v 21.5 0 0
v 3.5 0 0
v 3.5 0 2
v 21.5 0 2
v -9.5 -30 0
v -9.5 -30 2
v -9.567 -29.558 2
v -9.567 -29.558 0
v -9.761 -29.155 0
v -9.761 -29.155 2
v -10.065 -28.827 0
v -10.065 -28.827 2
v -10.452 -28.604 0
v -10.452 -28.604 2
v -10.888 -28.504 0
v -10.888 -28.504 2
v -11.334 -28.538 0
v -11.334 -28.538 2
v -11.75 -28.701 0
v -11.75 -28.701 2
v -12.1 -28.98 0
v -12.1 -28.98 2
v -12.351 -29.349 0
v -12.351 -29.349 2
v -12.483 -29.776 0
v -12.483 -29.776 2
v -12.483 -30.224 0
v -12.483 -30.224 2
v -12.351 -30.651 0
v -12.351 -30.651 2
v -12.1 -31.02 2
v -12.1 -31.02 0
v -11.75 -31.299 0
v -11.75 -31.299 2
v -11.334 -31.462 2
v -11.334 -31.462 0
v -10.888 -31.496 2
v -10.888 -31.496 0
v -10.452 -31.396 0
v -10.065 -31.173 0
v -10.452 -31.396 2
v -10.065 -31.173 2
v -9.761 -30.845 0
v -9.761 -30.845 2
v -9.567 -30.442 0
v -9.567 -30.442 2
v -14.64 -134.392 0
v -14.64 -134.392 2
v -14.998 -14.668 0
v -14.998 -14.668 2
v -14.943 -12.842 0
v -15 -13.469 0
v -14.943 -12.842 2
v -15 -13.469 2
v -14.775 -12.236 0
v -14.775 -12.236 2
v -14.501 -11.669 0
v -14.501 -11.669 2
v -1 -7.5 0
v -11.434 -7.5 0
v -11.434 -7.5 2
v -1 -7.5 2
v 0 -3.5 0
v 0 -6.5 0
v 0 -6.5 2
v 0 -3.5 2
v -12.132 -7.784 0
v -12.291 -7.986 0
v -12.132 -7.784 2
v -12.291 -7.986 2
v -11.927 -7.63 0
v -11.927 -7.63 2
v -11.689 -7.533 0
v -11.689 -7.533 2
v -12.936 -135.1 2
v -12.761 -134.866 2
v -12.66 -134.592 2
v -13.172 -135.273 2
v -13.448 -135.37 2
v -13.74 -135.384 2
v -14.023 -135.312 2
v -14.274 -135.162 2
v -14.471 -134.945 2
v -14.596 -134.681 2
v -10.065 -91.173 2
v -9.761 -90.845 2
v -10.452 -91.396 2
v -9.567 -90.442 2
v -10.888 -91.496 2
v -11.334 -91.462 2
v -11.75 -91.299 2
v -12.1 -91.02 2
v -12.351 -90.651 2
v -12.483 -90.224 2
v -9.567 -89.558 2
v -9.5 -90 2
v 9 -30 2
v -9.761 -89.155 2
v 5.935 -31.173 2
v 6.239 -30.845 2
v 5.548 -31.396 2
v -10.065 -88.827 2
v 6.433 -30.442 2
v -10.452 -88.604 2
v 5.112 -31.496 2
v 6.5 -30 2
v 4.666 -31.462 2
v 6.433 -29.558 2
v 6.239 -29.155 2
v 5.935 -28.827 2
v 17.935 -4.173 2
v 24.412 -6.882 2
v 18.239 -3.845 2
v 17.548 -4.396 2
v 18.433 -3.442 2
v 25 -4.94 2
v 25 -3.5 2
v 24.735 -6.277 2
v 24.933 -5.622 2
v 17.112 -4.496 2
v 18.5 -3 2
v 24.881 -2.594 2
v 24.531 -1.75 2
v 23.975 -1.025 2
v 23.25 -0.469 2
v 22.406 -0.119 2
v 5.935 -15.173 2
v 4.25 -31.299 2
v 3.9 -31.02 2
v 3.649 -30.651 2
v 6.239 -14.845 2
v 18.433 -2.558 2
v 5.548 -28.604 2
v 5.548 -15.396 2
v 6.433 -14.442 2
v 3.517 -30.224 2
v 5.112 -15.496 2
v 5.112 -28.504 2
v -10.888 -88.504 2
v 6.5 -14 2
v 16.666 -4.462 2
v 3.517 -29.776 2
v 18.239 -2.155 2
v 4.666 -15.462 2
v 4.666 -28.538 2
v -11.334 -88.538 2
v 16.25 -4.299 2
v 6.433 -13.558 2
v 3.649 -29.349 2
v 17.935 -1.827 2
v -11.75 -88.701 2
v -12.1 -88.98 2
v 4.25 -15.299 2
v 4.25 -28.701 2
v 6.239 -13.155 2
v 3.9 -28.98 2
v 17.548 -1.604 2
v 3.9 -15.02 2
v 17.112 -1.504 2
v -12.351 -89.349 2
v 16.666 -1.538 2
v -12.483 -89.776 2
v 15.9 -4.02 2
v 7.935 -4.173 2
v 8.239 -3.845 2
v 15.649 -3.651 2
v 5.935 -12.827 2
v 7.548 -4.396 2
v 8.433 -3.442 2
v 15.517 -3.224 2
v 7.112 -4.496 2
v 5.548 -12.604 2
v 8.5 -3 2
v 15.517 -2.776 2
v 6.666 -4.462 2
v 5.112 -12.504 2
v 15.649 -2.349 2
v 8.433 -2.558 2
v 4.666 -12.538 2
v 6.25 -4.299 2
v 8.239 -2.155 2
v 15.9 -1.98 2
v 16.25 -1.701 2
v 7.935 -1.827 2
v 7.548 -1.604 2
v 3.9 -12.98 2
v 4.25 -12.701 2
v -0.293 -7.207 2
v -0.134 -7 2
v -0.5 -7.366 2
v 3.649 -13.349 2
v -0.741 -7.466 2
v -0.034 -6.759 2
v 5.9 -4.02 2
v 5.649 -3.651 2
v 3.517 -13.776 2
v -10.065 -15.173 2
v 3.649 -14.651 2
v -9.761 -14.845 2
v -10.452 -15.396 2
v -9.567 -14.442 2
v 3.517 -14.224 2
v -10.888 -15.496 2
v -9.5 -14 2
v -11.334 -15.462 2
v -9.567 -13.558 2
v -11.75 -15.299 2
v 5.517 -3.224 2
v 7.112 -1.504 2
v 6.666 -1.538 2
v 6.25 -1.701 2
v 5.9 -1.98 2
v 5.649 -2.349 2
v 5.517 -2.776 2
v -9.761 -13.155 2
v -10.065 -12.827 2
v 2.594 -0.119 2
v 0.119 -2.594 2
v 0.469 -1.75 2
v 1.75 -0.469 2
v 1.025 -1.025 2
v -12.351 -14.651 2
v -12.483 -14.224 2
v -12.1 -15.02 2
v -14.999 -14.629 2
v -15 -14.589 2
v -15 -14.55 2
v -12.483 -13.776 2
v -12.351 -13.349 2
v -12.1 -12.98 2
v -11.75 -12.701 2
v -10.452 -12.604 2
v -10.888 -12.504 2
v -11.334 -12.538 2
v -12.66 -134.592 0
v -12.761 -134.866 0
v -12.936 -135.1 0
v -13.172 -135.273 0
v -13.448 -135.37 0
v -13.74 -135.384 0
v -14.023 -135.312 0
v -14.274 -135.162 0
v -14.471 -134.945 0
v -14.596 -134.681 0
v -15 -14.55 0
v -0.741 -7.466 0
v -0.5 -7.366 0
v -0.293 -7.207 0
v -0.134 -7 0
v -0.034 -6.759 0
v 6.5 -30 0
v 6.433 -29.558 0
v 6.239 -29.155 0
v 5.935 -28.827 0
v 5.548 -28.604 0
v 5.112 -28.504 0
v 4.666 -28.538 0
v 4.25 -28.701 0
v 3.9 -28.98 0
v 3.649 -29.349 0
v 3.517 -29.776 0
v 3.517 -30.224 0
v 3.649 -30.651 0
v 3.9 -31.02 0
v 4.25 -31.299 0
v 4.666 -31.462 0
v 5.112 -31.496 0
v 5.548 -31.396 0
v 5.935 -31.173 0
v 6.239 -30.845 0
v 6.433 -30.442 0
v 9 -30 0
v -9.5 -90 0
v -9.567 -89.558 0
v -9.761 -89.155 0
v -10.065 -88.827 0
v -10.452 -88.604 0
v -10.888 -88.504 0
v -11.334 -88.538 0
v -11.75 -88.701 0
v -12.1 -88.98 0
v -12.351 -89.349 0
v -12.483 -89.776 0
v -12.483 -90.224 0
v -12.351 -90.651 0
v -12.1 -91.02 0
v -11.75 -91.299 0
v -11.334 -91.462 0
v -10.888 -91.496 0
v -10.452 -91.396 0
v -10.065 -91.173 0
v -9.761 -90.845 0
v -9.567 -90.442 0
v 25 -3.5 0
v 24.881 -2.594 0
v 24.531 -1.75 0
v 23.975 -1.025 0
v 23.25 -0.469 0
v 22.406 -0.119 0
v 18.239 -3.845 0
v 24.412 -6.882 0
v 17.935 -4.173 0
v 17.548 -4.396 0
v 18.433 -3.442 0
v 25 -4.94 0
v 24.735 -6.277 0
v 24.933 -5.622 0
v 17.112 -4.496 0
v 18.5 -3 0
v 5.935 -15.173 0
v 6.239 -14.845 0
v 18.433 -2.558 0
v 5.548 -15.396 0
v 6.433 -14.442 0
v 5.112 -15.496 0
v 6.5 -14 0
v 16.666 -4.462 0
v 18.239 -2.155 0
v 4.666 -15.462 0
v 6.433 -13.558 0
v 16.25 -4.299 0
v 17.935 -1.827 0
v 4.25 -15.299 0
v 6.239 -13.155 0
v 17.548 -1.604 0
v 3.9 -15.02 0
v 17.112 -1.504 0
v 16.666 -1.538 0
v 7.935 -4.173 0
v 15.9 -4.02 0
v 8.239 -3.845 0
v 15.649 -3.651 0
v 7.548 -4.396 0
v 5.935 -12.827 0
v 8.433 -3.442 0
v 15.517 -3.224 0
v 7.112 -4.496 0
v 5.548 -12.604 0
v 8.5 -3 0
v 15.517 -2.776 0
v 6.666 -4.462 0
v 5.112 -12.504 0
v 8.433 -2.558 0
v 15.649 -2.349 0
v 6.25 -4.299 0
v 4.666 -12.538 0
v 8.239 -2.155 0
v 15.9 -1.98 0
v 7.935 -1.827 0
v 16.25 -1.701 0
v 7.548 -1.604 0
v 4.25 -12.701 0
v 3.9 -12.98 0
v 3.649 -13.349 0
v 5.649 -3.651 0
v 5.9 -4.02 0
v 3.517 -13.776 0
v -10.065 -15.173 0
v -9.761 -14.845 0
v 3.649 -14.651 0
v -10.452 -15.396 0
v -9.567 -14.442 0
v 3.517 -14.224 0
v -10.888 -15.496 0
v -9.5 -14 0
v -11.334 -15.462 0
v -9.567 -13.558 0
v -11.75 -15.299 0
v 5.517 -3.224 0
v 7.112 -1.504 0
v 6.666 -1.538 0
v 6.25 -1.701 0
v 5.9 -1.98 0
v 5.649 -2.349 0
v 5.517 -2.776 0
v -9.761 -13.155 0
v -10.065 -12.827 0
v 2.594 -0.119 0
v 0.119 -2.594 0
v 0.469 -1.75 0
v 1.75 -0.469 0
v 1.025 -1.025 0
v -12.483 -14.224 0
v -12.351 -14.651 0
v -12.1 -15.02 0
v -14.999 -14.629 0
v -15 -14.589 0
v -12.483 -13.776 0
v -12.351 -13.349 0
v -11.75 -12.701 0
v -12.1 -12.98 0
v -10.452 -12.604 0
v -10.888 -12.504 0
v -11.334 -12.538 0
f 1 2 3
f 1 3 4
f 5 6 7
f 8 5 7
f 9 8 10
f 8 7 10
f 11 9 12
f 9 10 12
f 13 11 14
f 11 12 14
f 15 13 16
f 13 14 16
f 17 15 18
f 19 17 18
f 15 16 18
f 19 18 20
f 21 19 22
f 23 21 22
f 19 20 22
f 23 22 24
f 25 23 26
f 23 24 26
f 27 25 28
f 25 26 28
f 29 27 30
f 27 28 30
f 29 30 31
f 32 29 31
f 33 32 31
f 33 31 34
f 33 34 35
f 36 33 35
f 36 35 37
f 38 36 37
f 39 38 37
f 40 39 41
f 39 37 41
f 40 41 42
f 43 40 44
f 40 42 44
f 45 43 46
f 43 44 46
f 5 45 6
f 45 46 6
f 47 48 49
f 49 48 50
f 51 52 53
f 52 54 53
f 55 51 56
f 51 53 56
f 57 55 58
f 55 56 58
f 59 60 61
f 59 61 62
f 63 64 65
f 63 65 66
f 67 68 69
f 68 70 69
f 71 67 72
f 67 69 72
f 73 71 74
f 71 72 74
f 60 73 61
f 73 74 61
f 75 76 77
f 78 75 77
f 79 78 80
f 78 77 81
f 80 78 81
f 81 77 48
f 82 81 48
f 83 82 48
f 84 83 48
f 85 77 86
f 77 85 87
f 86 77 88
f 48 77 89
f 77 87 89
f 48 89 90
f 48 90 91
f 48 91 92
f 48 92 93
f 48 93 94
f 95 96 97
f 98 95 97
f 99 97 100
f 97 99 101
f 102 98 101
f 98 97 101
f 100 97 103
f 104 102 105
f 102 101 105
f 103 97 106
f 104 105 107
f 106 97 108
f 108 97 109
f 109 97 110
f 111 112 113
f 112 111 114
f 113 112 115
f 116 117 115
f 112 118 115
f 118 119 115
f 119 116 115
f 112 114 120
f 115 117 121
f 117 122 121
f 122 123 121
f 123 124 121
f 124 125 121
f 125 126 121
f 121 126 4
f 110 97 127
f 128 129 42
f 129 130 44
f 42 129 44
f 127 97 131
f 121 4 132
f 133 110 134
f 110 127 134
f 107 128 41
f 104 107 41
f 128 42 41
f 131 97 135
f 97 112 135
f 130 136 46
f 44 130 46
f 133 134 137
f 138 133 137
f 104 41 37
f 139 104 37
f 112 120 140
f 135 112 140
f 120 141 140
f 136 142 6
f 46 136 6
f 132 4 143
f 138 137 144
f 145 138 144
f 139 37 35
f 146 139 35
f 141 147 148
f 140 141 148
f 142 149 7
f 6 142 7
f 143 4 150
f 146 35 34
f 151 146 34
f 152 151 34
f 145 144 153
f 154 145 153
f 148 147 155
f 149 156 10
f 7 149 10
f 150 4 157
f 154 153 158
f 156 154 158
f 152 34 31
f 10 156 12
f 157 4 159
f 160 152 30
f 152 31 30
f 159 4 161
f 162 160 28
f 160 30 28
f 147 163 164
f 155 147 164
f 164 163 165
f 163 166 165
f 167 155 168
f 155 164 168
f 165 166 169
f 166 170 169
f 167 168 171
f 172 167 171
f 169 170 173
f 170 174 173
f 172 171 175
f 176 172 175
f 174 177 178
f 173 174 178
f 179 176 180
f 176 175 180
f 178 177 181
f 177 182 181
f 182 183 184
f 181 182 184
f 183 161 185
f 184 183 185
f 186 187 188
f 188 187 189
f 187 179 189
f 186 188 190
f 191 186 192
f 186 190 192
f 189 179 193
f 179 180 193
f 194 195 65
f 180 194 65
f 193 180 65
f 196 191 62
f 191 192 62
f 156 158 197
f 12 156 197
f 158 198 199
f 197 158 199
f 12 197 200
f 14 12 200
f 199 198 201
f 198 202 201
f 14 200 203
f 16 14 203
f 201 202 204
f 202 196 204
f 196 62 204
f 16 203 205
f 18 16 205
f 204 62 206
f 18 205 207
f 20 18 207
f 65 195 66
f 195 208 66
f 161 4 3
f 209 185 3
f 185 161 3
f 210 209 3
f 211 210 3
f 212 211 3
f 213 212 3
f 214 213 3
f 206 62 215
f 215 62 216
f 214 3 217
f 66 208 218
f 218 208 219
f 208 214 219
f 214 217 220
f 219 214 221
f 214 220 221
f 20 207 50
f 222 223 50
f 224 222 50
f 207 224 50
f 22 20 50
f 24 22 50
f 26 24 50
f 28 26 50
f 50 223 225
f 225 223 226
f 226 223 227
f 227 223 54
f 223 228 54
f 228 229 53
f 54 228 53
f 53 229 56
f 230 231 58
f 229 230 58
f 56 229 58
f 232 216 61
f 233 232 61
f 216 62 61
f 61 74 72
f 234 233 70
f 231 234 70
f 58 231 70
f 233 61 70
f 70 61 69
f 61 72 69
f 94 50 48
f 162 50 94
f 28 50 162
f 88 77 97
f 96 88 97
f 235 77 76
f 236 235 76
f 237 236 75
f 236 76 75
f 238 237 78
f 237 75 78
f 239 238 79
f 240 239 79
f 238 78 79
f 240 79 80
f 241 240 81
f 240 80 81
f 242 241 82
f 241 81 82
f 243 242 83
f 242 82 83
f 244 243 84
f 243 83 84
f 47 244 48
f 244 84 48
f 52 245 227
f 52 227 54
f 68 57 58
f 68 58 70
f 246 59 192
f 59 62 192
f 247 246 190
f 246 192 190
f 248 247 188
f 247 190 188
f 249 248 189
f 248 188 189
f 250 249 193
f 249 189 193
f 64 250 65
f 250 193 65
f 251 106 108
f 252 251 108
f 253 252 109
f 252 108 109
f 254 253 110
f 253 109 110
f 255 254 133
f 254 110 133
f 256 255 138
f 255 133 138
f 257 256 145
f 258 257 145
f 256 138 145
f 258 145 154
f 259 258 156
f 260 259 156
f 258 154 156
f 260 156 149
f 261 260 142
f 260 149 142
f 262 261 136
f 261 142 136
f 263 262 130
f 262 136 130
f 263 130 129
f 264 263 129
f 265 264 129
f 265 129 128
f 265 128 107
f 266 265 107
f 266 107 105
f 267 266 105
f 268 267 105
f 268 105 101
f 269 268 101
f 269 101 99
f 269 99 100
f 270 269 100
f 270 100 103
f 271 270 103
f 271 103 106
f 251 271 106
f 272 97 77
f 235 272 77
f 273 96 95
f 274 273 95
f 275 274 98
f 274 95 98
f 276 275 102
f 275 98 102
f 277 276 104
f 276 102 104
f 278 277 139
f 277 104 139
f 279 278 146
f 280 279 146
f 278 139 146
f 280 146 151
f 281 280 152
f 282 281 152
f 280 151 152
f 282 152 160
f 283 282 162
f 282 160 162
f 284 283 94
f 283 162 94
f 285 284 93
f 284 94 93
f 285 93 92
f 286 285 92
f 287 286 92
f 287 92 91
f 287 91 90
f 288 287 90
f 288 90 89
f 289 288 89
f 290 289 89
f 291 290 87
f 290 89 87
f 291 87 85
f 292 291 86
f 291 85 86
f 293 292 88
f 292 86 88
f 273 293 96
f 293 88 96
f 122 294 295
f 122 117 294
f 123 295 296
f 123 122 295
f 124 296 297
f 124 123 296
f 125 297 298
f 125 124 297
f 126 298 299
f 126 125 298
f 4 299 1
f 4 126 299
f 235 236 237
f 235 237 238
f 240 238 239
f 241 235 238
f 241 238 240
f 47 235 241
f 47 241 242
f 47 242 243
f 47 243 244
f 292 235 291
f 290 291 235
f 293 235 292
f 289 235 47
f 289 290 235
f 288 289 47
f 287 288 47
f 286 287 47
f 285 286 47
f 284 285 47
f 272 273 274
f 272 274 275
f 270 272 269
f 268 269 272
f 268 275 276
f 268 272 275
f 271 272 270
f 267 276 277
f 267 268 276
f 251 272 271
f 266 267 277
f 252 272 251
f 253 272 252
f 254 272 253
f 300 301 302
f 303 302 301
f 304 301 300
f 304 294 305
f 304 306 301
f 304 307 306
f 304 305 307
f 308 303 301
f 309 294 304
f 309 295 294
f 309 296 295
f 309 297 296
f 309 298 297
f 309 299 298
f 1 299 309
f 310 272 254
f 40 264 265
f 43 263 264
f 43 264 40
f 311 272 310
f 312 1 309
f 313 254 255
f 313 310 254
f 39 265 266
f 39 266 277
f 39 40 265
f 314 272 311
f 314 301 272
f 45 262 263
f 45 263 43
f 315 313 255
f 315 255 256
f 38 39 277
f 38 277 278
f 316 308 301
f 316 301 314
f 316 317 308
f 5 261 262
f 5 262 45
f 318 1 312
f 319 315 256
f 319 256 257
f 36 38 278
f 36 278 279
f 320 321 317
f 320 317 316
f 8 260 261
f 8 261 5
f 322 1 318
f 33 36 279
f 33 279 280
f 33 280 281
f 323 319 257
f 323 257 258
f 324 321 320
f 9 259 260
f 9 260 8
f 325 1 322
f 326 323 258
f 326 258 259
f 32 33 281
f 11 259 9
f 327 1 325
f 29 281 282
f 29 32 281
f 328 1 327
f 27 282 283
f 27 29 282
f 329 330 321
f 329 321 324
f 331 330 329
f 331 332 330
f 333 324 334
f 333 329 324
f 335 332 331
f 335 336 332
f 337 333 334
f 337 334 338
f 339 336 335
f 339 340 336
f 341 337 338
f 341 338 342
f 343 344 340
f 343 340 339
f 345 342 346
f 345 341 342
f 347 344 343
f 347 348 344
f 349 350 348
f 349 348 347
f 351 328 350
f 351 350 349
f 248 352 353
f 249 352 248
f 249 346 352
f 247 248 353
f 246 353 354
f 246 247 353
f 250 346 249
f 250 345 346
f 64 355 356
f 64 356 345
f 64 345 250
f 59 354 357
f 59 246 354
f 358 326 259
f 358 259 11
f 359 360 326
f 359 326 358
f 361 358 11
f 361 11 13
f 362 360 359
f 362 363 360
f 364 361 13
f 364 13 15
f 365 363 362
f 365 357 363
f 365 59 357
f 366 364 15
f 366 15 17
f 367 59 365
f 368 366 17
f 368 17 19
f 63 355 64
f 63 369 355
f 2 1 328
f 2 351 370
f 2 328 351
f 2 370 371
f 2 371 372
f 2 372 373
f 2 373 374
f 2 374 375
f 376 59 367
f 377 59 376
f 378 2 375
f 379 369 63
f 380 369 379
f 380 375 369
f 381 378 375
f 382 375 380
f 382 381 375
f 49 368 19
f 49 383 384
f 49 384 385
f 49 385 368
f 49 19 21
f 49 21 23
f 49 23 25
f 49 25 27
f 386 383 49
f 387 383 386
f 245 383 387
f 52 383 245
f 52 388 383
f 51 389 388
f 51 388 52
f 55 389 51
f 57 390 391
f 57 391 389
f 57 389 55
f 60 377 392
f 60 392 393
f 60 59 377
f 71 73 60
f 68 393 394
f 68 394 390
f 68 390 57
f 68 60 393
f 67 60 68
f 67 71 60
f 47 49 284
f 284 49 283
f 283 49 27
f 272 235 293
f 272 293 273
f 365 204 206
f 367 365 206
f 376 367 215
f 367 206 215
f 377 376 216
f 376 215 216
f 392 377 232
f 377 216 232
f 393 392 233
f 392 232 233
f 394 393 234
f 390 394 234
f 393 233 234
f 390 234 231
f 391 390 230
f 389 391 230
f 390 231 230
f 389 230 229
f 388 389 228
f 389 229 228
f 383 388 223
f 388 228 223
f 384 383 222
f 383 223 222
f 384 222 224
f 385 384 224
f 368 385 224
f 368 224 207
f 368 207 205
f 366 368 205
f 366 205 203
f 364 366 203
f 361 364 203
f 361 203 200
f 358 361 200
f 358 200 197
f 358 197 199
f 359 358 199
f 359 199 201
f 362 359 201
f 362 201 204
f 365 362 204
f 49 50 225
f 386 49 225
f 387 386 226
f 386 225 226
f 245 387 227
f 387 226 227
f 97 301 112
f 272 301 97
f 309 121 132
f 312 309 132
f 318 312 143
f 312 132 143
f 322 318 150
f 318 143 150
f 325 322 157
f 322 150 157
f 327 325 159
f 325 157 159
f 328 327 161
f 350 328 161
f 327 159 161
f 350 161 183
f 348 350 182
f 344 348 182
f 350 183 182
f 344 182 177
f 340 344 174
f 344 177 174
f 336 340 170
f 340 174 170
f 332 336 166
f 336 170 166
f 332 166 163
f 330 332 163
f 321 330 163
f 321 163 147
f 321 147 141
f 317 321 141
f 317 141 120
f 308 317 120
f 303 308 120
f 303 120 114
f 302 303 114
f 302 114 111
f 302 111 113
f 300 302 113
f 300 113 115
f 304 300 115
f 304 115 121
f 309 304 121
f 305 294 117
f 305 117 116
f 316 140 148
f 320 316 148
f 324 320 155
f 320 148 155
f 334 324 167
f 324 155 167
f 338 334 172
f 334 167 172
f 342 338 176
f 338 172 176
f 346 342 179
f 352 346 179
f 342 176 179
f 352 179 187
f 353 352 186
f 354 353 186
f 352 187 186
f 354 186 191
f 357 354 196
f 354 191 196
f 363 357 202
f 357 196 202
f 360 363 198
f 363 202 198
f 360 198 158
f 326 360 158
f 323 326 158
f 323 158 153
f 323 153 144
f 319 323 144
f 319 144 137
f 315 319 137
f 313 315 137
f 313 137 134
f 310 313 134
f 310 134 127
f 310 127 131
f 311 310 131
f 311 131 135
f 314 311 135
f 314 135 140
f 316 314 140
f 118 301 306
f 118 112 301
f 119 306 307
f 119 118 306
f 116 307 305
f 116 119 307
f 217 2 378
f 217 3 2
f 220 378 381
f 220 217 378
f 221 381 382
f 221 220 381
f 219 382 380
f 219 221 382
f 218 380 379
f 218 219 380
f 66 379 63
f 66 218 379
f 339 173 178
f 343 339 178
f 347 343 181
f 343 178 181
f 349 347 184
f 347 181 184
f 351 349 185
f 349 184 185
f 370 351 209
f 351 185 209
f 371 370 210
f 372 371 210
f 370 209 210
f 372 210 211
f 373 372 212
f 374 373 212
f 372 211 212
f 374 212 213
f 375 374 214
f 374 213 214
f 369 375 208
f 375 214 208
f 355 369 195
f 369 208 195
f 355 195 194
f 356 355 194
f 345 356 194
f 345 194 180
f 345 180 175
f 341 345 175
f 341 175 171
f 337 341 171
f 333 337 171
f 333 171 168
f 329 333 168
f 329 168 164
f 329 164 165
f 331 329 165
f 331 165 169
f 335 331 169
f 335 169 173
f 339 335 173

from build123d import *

# Parameters (mm, degrees)
EXTRUDE_1_DEPTH     = 2
SKETCH_2_R          = 1.5
CUT_EXTRUDE_1_DEPTH = 5
SKETCH_3_R          = 1.5
CUT_EXTRUDE_2_DEPTH = 10
FILLET_1_R          = 3.5
FILLET_2_R          = 1
SKETCH_4_R          = 1.5
EXTRUDE_2_DEPTH     = 2


with BuildPart() as part:
    # 草图1 → 凸台-拉伸1 (new body)
    with BuildSketch(Plane.XY):
        Polygon((5, -36), (-15, -16), (-15, -12.5), (-12, -7.5), (0, -7.5), (0, 0), (25, 0), (25, -6), align=None)
    extrude(amount=EXTRUDE_1_DEPTH)

    # 草图2 → 切除-拉伸1 (cut)
    with BuildSketch(Plane.XY.offset(2)):
        with Locations((17, -3)):
            Circle(SKETCH_2_R)
        with Locations((7, -3)):
            Circle(SKETCH_2_R)
    extrude(amount=-CUT_EXTRUDE_1_DEPTH, mode=Mode.SUBTRACT)

    # 草图3 → 切除-拉伸2 (cut)
    with BuildSketch(Plane.XY.offset(2)):
        with Locations((5, -30)):
            Circle(SKETCH_3_R)
        with Locations((5, -14)):
            Circle(SKETCH_3_R)
        with Locations((-11, -14)):
            Circle(SKETCH_3_R)
    extrude(amount=-CUT_EXTRUDE_2_DEPTH, mode=Mode.SUBTRACT)

    # 圆角1
    fillet_1_edges = [part.edges().sort_by_distance(p)[0] for p in [
        (25, 0, 1),
        (25, -6, 1),
        (5, -36, 1),
        (-15, -16, 1),
        (-15, -12.5, 1),
        (0, 0, 1),
    ]]
    fillet(fillet_1_edges, radius=FILLET_1_R)

    # 圆角2
    fillet_2_edges = [part.edges().sort_by_distance(p)[0] for p in [
        (-12, -7.5, 1),
        (0, -7.5, 1),
    ]]
    fillet(fillet_2_edges, radius=FILLET_2_R)

    # 草图4 → 凸台-拉伸2 (add)
    with BuildSketch(Plane.XY.offset(2)):
        with BuildLine():
            Line((9, -30), (-12.660289895, -134.591804029))
            ThreePointArc((-12.660289895, -134.591804029), (-13.739948562, -135.383956892), (-14.639507537, -134.392007979))
            Line((-14.639507537, -134.392007979), (-15, -14.009848205))
            Line((-15, -14.009848205), (9, -30))
        make_face()
        with Locations((-11, -30)):
            Circle(SKETCH_4_R, mode=Mode.SUBTRACT)
        with Locations((-11, -90)):
            Circle(SKETCH_4_R, mode=Mode.SUBTRACT)
        with Locations((5, -30)):
            Circle(SKETCH_4_R, mode=Mode.SUBTRACT)
    extrude(amount=-EXTRUDE_2_DEPTH)


solid = part.part
